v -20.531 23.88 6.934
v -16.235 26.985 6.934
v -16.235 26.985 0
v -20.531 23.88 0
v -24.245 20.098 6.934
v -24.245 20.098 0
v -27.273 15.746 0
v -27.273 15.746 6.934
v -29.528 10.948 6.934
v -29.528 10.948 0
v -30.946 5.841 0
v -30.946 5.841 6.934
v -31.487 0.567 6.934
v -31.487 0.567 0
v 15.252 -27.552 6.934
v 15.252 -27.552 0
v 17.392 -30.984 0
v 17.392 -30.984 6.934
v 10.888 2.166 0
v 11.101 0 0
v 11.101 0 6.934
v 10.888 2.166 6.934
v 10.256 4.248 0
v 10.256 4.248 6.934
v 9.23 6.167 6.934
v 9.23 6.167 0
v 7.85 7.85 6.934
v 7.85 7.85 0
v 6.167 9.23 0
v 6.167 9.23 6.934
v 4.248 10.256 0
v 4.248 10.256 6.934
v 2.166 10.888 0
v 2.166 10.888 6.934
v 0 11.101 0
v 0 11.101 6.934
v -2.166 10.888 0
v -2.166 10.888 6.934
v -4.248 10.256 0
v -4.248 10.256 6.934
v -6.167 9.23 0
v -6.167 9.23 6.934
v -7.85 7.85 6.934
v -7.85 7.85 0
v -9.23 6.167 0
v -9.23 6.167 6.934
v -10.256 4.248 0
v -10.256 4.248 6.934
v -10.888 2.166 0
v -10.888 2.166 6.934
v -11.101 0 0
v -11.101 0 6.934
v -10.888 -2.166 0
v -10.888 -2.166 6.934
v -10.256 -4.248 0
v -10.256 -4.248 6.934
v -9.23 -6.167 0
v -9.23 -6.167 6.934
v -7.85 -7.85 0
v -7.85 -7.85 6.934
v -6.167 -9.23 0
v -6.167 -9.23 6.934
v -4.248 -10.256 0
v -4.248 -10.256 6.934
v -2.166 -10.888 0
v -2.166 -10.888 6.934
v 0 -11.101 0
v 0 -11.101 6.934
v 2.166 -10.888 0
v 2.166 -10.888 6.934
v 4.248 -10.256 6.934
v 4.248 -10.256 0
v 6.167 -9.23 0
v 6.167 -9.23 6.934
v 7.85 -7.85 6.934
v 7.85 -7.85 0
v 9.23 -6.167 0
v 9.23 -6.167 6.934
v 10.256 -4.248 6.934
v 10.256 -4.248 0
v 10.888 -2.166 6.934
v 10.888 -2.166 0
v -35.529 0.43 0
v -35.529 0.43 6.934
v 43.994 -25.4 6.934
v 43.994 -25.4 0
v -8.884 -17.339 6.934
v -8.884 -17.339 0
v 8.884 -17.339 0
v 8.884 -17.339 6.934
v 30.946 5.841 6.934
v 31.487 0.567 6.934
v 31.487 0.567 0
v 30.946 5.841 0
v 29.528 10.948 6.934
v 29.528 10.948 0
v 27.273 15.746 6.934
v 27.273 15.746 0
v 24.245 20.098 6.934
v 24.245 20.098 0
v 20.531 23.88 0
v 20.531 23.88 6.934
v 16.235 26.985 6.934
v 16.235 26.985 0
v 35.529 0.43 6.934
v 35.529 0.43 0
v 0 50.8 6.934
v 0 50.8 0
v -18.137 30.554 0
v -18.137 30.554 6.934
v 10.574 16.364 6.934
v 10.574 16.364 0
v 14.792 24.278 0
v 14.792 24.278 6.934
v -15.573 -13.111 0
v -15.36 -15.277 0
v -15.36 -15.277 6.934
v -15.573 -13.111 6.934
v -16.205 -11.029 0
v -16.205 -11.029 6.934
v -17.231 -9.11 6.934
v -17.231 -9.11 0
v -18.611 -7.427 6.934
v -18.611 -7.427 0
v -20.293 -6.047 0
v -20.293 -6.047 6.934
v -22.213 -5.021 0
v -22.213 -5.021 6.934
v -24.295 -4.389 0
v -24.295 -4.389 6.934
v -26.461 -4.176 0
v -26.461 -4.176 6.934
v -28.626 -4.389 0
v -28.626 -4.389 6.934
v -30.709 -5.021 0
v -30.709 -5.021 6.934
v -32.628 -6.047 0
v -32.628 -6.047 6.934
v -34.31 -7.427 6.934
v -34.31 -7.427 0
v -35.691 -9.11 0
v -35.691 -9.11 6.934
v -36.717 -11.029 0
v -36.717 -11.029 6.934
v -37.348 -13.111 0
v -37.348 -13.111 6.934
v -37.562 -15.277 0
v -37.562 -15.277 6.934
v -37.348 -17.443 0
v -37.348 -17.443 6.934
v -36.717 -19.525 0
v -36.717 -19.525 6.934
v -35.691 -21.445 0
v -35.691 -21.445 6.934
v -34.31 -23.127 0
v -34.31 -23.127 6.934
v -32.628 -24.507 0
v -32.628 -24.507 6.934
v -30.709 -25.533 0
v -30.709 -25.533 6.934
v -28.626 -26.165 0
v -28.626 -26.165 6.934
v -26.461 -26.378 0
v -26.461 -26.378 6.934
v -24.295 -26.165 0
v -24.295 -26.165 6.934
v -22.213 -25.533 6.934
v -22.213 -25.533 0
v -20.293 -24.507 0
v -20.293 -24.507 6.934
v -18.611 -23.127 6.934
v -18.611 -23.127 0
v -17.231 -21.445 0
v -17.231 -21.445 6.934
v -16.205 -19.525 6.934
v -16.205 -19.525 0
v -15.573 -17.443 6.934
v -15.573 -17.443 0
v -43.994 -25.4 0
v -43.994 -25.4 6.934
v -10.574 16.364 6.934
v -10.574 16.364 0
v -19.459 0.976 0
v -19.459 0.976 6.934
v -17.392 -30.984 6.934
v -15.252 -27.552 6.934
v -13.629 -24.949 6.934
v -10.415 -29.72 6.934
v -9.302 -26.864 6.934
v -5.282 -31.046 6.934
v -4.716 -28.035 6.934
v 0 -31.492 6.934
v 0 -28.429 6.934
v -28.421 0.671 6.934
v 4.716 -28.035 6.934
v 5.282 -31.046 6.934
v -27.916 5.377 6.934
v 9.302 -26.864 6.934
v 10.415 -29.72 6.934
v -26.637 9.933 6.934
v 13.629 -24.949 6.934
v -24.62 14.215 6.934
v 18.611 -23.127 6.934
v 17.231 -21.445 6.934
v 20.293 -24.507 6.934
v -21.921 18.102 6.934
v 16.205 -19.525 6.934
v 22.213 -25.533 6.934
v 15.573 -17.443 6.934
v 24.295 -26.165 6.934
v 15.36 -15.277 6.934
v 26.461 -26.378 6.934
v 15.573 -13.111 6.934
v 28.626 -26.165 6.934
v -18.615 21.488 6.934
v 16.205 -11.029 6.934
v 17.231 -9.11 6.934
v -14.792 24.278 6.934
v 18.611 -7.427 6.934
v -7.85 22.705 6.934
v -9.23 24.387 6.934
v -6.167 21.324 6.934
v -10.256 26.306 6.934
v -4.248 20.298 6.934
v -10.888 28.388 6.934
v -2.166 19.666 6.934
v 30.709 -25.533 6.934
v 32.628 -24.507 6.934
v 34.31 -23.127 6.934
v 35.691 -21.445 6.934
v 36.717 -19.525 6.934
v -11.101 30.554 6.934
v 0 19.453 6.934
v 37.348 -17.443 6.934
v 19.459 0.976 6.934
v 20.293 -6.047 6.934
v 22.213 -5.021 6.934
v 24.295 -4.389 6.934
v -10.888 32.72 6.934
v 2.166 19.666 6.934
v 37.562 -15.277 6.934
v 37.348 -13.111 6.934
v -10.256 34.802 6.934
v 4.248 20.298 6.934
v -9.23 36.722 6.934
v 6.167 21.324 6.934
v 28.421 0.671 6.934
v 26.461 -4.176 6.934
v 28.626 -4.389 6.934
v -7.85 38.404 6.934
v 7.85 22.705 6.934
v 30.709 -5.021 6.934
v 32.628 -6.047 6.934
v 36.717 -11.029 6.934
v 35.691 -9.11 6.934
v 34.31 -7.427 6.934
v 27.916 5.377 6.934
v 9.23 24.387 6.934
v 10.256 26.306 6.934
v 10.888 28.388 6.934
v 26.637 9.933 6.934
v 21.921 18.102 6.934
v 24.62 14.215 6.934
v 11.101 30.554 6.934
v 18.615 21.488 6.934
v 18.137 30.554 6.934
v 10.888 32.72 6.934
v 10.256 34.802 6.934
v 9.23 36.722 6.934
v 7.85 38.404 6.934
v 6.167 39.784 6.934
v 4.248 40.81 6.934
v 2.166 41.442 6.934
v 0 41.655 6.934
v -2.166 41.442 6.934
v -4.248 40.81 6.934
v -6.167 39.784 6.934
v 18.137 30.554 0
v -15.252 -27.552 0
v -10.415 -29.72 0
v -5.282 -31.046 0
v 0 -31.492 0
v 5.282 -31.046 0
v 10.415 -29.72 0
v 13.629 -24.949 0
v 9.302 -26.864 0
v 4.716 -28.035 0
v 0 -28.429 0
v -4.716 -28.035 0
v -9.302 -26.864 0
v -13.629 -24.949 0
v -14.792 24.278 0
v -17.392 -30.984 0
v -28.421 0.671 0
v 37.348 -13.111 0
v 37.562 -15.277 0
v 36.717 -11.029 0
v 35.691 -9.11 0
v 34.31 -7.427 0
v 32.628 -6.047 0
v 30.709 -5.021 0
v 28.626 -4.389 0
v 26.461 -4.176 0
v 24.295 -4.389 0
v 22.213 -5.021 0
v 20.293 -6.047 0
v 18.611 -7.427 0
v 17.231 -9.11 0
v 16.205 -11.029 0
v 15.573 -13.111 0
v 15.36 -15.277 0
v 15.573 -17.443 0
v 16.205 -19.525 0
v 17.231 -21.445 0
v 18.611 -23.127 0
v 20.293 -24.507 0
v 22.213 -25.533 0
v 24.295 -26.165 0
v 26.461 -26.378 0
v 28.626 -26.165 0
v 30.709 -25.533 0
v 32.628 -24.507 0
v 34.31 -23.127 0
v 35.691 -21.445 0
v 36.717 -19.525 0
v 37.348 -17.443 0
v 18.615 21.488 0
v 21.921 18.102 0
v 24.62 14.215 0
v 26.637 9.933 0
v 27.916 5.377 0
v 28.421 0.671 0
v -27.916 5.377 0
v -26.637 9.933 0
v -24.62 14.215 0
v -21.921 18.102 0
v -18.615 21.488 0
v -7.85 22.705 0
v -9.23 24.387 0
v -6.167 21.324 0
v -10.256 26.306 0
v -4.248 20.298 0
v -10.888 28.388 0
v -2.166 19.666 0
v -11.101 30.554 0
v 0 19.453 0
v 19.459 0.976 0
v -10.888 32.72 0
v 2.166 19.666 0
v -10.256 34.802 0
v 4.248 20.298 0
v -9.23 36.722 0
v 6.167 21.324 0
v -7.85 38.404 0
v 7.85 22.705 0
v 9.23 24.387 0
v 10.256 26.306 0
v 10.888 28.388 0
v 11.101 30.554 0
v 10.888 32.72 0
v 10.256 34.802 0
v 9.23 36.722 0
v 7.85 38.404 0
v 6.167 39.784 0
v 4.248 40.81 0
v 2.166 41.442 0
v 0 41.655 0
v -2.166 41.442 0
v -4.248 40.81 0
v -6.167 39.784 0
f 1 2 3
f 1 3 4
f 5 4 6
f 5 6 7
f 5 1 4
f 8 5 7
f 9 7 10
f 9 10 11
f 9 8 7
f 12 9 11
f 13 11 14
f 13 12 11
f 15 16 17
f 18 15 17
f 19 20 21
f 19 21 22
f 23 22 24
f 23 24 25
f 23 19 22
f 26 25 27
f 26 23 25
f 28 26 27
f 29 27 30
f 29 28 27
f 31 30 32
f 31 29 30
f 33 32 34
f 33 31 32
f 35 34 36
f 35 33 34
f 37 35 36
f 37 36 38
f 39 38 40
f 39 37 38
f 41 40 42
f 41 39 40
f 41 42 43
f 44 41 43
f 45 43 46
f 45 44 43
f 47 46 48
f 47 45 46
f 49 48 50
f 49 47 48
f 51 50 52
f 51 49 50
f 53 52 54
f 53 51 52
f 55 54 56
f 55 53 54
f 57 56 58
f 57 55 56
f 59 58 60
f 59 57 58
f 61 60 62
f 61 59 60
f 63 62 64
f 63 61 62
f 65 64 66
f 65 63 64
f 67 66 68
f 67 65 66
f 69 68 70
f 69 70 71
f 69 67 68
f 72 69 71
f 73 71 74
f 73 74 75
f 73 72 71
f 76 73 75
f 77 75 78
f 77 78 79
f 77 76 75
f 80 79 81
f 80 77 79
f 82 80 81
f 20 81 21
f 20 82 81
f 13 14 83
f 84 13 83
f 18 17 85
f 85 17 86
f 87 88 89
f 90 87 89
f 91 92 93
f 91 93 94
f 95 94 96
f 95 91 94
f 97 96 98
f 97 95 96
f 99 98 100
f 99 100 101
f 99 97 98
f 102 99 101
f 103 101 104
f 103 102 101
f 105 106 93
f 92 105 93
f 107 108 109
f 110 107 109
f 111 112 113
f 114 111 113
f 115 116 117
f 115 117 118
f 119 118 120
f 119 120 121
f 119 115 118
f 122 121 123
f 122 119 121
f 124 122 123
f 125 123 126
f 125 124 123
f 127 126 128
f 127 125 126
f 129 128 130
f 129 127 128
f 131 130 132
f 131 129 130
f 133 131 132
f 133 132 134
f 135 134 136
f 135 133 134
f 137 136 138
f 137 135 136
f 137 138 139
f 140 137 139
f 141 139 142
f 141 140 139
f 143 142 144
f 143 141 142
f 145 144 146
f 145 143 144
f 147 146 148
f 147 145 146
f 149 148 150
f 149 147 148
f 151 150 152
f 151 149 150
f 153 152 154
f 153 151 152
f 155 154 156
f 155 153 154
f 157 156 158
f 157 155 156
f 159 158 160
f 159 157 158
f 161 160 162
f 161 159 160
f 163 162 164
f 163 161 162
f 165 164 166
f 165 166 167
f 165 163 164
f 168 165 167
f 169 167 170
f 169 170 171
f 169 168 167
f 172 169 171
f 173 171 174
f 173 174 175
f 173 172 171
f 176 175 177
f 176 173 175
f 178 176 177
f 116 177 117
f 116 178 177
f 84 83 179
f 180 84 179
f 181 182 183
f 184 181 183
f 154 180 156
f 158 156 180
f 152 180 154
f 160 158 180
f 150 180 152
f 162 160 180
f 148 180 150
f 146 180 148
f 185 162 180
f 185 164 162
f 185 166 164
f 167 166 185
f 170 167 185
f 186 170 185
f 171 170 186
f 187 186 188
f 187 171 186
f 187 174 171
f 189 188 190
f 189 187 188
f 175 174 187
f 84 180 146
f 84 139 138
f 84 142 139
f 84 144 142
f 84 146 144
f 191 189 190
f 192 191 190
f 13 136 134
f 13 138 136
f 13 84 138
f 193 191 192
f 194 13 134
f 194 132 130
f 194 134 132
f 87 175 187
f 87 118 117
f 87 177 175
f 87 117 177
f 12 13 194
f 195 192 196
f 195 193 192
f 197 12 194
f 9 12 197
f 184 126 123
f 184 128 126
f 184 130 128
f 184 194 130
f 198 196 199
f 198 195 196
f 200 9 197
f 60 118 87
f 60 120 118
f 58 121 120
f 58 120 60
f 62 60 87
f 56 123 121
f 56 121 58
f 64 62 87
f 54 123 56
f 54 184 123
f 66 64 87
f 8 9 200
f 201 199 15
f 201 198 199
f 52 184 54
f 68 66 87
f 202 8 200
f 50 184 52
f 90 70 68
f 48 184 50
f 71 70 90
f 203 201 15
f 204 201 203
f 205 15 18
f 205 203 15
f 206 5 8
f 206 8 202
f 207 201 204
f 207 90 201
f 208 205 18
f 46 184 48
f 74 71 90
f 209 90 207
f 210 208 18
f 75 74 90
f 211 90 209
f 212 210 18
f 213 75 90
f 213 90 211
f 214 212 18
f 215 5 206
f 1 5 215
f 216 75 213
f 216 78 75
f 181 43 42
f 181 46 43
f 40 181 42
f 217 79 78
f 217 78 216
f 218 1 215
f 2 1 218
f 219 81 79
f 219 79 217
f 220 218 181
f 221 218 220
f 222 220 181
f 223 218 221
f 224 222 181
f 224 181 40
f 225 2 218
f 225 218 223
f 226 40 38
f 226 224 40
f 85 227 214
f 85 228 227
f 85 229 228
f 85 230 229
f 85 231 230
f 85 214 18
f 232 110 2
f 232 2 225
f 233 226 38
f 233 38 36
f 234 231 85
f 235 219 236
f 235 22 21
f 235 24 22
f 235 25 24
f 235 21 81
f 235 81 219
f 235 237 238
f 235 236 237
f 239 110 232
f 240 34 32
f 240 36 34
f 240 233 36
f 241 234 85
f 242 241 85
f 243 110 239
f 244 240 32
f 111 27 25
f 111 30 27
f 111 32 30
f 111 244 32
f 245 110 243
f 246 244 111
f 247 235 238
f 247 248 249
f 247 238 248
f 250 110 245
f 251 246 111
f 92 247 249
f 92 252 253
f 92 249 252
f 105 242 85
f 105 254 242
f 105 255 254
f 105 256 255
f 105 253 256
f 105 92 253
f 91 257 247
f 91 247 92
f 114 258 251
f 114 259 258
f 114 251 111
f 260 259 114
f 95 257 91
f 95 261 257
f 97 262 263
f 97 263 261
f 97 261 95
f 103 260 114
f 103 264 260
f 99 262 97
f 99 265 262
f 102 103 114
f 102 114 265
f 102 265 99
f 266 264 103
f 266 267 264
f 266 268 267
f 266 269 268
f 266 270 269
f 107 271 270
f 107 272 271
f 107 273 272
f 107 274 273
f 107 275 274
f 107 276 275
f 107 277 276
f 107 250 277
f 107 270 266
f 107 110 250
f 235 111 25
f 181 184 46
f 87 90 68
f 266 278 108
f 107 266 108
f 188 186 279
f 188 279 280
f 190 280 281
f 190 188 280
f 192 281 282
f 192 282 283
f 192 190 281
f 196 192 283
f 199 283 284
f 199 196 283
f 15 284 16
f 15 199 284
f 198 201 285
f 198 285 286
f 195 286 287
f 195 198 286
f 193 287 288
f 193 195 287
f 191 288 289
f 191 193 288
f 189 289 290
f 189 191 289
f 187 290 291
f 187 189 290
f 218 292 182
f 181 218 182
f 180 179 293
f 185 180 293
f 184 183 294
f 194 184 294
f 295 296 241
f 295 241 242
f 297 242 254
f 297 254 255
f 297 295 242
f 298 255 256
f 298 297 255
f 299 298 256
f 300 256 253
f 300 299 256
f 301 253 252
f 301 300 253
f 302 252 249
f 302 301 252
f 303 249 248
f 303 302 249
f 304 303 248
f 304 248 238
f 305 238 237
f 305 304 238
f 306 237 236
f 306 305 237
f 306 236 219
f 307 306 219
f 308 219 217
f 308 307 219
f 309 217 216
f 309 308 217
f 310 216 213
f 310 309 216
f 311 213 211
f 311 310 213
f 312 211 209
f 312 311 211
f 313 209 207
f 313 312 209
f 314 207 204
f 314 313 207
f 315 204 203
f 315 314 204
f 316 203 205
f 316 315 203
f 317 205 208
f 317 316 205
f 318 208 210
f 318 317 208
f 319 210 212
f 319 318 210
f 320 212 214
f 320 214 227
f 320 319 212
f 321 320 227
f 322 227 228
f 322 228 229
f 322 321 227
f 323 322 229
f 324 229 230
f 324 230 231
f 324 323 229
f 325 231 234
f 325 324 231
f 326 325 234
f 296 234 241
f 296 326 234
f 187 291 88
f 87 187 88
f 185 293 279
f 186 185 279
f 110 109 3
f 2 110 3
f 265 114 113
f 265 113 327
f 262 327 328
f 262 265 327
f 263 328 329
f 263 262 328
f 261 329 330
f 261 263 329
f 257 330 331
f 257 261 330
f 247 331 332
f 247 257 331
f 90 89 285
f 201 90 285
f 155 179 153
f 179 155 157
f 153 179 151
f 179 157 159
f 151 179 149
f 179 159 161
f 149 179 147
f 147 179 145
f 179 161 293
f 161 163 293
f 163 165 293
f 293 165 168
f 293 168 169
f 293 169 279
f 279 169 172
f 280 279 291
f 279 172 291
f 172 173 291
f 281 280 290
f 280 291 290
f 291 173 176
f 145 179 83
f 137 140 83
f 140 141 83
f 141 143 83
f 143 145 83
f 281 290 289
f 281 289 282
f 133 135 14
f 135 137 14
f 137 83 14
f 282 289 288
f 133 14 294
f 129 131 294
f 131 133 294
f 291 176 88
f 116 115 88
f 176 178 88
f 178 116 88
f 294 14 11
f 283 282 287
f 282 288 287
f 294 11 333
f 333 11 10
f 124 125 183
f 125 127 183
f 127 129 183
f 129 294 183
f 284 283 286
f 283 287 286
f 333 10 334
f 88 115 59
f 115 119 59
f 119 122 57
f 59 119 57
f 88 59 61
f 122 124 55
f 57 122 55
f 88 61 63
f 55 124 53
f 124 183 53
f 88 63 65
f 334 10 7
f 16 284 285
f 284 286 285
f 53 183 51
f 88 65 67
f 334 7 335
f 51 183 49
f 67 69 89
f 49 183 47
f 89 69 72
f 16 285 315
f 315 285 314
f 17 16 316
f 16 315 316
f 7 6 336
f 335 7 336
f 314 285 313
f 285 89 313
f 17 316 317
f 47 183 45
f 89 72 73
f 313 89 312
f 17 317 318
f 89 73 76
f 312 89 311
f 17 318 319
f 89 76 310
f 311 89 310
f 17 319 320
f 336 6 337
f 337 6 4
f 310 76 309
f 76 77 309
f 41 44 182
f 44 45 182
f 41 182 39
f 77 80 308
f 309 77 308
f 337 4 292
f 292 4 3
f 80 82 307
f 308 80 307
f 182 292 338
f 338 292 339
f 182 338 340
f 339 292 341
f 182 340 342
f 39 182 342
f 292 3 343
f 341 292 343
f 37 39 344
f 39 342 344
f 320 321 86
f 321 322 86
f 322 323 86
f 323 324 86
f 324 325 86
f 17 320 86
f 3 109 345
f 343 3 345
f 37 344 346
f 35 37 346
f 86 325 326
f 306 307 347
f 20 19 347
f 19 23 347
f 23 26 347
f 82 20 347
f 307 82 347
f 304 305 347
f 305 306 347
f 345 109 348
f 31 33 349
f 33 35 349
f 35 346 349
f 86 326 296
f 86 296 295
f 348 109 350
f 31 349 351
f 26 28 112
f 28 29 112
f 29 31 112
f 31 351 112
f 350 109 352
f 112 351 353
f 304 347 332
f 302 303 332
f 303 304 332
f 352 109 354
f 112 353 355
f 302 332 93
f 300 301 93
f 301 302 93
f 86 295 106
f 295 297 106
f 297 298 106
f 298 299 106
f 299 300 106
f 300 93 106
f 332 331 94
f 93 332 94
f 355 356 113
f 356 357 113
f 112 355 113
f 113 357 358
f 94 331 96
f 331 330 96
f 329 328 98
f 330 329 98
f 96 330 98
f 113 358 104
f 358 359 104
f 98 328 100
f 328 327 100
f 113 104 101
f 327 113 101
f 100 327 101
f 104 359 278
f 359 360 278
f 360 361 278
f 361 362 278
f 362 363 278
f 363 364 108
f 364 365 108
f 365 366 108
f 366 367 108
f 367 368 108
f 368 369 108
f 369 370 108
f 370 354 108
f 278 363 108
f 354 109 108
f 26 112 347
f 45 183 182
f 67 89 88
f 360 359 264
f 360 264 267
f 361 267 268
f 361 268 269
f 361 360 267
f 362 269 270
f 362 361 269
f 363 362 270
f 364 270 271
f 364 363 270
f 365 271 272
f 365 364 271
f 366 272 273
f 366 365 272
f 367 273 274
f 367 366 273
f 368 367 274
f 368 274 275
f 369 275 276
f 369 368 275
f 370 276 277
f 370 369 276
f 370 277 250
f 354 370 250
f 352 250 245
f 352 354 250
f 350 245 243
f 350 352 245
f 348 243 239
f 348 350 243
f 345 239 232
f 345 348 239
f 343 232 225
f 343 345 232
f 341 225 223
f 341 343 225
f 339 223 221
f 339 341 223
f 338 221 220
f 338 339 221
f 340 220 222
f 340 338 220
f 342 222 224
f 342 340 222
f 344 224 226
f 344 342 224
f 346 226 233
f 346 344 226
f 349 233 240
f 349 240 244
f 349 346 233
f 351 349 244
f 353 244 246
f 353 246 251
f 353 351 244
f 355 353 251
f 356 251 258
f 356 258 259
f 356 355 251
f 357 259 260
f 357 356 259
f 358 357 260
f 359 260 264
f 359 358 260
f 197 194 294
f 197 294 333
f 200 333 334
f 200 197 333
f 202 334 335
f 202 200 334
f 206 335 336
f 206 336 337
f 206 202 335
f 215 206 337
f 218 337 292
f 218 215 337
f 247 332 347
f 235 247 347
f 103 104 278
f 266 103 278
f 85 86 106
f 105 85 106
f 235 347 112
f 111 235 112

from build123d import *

# Parameters (mm, degrees)
F0_R     = 11.10107
F1_DEPTH = 6.9342
F3_DEPTH = 6.9342


with BuildPart() as f1:
    # F0 (on Top) → F1 (new body)
    with BuildSketch(Plane.XY):
        Polygon((18.1369372315, 30.5542092799), (0, 50.8), (-18.1369372315, 30.5542092799), (-10.5741708498, 16.3638919404), (-19.4586315501, 0.9755546097), (-35.5291900447, 0.4299437494), (-43.9940905122, -25.4), (-17.3922528132, -30.9841530293), (-8.8844607003, -17.3394465501), (8.8844607003, -17.3394465501), (17.3922528132, -30.9841530293), (43.9940905122, -25.4), (35.5291900447, 0.4299437494), (19.4586315501, 0.9755546097), (10.5741708498, 16.3638919404), align=None)
        with Locations((-26.4607214289, -15.27710464)):
            Circle(F0_R, mode=Mode.SUBTRACT)
        with Locations((26.4607214289, -15.27710464)):
            Circle(F0_R, mode=Mode.SUBTRACT)
        Circle(F0_R, mode=Mode.SUBTRACT)
        with Locations((0, 30.5542092799)):
            Circle(F0_R, mode=Mode.SUBTRACT)
    extrude(amount=F1_DEPTH)

    # F2 (on face) → F3 (join)
    with BuildSketch(Plane.XY.offset(6.9342)):
        with BuildLine():
            Line((15.2522996768, -27.5521189554), (13.6293113813, -24.9491875935))
            ThreePointArc((13.6293113813, -24.9491875935), (0, -28.4292119185), (-13.6293113813, -24.9491875935))
            Line((-13.6293113813, -24.9491875935), (-15.2522996768, -27.5521189554))
            ThreePointArc((-15.2522996768, -27.5521189554), (0, -31.4920927276), (15.2522996768, -27.5521189554))
        make_face()
        with BuildLine():
            ThreePointArc((14.7919745691, 24.2779236891), (24.620419731, 14.2146059592), (28.4212859504, 0.6712639045))
            Line((28.4212859504, 0.6712639045), (31.4869847819, 0.5671804915))
            ThreePointArc((31.4869847819, 0.5671804915), (27.2729523205, 15.7460463638), (16.2346851051, 26.984938464))
            Line((16.2346851051, 26.984938464), (14.7919745691, 24.2779236891))
        make_face()
        with BuildLine():
            ThreePointArc((-28.4212859504, 0.6712639045), (-24.620419731, 14.2146059592), (-14.7919745691, 24.2779236891))
            Line((-14.7919745691, 24.2779236891), (-16.2346851051, 26.984938464))
            ThreePointArc((-16.2346851051, 26.984938464), (-27.2729523205, 15.7460463638), (-31.4869847819, 0.5671804915))
            Line((-31.4869847819, 0.5671804915), (-28.4212859504, 0.6712639045))
        make_face()
    extrude(amount=-F3_DEPTH)


solid = f1.part
